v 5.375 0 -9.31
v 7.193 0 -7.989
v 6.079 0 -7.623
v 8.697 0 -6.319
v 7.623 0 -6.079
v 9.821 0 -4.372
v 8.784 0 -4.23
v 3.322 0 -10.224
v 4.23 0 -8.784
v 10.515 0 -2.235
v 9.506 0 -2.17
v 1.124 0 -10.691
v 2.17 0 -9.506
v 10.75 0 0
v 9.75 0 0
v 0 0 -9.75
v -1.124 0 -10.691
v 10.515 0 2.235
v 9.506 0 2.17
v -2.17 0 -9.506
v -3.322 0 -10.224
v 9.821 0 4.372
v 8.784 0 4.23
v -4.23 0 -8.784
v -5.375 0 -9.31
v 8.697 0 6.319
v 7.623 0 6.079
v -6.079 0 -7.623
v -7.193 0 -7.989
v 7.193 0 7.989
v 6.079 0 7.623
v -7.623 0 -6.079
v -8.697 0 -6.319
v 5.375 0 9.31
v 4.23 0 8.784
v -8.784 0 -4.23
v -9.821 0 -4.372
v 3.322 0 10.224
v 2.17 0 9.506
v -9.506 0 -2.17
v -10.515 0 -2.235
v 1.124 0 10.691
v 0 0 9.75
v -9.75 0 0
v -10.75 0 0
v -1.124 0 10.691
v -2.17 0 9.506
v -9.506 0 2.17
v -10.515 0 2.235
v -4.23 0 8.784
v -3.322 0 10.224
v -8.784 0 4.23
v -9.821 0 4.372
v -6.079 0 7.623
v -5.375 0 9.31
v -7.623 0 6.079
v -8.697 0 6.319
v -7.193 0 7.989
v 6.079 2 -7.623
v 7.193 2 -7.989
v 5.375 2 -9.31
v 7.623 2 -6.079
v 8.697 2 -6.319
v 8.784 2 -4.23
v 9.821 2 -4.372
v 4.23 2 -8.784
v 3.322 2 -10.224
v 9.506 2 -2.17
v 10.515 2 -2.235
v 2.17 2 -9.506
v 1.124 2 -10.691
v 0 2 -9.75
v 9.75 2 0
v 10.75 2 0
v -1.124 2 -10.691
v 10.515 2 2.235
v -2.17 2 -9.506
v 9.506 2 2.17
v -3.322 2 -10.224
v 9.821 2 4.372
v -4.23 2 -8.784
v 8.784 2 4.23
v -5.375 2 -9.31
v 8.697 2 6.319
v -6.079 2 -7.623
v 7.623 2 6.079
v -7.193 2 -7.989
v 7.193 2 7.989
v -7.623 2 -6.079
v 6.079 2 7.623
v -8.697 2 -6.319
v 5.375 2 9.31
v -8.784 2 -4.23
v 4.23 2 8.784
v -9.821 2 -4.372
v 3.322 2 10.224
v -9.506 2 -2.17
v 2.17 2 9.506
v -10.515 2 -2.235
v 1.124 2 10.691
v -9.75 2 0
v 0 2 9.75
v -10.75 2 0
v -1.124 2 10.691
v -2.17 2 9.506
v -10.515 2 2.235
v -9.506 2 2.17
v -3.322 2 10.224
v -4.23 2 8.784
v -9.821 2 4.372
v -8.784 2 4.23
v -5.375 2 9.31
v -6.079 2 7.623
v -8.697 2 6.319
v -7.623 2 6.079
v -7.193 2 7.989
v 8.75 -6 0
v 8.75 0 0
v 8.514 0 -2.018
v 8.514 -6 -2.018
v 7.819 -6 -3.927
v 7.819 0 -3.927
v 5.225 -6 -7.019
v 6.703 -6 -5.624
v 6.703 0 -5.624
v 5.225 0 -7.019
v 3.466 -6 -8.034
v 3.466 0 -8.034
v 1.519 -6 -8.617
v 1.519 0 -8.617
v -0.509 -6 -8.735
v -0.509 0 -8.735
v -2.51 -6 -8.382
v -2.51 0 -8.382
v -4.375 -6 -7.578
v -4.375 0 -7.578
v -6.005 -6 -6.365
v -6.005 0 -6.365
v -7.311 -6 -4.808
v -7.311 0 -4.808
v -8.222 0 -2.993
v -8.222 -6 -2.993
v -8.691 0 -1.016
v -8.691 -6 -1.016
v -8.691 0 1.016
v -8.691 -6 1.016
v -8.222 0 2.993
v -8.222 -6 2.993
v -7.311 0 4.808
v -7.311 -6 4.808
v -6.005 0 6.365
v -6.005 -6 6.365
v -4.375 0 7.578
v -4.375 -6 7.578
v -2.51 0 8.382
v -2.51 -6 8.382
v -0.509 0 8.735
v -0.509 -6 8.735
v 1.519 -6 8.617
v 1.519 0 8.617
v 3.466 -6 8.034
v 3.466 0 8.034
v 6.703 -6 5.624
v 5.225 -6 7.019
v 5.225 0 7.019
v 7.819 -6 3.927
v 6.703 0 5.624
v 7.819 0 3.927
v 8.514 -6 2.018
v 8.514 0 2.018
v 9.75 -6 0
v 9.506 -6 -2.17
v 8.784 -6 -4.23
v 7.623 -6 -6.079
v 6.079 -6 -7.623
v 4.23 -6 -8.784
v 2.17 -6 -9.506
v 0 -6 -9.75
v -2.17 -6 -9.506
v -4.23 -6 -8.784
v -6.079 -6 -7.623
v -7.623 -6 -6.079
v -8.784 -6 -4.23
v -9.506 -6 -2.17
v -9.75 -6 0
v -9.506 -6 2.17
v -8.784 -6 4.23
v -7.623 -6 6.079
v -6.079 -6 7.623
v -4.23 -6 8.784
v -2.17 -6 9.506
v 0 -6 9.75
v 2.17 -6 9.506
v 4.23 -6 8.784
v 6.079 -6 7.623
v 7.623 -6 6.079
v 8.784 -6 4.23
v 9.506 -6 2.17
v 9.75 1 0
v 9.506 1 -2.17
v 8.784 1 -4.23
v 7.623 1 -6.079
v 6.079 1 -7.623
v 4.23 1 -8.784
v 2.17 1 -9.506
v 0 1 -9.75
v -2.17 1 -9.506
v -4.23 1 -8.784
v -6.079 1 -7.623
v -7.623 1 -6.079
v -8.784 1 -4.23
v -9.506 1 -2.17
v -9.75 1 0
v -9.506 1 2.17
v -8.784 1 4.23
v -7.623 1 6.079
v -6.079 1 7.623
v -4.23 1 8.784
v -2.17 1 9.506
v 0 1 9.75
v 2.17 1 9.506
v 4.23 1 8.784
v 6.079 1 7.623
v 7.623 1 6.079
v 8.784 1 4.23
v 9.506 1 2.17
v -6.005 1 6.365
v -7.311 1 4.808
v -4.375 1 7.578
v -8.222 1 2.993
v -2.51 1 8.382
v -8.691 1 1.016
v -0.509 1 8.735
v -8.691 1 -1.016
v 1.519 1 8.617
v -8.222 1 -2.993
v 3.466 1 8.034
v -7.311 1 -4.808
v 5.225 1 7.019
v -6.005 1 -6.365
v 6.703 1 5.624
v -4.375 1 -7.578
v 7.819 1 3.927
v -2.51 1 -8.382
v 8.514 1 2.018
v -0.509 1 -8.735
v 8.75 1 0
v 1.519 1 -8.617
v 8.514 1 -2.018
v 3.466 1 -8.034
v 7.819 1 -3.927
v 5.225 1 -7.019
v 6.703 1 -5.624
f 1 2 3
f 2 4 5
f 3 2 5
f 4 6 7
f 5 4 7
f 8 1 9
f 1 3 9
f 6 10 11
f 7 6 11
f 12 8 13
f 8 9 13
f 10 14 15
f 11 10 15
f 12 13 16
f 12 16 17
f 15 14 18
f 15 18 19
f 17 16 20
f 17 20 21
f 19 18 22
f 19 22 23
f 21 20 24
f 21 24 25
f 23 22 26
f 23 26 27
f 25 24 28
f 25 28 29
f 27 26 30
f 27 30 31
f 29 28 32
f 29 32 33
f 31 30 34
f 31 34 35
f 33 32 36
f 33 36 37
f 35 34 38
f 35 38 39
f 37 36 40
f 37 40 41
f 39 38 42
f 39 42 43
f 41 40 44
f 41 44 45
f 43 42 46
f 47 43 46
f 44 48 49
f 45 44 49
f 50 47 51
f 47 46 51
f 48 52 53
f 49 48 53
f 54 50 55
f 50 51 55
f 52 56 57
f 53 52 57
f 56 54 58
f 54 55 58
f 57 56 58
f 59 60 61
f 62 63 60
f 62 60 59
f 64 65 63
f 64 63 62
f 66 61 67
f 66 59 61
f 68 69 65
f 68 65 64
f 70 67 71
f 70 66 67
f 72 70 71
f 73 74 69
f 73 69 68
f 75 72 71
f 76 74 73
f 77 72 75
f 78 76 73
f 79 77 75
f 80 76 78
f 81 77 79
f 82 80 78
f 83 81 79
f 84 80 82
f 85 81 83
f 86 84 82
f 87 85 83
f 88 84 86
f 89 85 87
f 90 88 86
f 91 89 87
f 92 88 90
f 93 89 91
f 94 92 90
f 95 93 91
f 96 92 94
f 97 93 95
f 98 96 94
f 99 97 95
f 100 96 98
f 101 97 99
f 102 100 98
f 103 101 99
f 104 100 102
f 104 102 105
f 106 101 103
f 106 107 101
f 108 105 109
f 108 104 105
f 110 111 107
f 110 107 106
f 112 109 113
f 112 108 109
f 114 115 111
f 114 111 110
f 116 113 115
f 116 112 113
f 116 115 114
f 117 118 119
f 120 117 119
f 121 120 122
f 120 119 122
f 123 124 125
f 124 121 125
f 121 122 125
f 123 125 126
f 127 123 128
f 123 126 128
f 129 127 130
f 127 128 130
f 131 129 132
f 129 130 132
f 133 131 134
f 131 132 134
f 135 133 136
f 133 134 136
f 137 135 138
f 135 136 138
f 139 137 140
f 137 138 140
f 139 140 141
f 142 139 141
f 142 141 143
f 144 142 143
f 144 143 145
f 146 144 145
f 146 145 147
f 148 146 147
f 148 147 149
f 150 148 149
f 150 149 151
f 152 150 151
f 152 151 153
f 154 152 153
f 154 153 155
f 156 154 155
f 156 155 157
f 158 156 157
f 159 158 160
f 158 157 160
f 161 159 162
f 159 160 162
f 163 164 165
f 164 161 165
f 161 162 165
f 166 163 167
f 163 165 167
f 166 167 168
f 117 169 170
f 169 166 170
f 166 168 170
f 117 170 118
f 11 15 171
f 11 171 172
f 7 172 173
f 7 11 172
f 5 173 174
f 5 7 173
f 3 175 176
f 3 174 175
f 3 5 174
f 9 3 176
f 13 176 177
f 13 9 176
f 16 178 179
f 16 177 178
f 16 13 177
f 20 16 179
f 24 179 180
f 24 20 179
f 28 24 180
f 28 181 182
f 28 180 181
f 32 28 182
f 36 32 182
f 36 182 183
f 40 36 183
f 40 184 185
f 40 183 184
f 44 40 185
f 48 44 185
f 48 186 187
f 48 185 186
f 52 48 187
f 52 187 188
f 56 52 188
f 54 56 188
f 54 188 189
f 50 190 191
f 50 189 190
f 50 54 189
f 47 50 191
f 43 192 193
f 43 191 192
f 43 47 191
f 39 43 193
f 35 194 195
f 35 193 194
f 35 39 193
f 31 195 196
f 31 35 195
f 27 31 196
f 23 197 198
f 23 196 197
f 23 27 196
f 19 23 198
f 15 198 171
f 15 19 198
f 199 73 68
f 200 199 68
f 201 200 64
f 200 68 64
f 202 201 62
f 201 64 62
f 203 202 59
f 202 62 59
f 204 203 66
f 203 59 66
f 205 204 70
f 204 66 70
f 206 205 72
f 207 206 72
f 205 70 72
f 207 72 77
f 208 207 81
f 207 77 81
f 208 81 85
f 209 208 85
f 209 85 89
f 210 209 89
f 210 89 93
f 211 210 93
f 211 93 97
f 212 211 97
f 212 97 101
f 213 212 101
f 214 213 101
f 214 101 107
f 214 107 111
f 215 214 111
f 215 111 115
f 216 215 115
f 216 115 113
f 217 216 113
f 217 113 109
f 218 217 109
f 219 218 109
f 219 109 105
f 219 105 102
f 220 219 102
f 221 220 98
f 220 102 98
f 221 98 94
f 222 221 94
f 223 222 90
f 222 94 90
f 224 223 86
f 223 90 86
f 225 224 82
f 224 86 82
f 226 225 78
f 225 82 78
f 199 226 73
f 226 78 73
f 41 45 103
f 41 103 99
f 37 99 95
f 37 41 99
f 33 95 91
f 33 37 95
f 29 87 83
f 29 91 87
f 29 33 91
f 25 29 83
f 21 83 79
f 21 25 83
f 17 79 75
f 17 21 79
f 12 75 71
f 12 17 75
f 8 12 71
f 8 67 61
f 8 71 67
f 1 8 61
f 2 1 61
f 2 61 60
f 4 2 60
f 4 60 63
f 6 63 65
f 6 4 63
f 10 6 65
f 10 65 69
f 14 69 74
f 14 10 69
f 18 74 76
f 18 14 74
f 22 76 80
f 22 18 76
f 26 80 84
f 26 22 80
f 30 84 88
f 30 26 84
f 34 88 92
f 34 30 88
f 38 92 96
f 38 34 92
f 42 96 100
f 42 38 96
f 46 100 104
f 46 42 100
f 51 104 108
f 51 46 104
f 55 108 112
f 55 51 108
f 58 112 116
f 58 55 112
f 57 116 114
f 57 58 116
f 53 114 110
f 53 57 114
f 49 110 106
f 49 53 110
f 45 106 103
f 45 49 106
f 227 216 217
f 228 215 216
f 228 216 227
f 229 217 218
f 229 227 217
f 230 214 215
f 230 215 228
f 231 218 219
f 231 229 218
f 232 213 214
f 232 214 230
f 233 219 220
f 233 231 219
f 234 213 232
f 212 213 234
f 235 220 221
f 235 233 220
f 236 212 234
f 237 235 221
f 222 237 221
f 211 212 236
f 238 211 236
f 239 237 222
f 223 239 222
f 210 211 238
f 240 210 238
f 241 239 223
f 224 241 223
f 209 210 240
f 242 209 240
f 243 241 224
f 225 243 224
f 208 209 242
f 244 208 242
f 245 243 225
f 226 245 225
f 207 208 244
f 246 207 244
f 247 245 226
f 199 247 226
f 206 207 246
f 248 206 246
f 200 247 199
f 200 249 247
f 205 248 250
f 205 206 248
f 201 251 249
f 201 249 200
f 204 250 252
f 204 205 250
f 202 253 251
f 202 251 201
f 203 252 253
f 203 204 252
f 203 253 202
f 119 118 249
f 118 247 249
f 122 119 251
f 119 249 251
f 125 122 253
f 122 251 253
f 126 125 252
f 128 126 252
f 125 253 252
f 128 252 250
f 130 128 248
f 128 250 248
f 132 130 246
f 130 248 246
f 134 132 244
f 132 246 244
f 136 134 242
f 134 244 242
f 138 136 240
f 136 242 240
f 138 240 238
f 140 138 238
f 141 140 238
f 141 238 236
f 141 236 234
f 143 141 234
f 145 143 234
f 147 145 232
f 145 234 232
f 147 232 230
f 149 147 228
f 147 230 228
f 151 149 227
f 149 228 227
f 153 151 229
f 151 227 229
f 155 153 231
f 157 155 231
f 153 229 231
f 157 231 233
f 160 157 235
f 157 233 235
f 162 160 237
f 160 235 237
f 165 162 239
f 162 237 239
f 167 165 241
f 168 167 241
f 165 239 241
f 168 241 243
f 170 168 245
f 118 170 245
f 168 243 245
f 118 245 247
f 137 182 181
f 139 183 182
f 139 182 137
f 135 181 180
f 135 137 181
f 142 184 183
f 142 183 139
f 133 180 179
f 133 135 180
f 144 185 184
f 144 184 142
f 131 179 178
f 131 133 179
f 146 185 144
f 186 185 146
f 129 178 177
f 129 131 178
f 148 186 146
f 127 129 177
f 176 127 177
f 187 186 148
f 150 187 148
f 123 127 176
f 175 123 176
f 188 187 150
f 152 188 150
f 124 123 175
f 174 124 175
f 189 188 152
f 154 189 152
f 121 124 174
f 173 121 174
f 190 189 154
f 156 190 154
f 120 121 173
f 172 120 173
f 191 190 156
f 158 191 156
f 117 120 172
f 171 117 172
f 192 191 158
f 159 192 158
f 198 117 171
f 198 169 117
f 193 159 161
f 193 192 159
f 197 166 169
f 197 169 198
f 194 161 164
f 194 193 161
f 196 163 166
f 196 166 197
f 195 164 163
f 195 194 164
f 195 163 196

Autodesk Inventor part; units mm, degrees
ref_plane "YZ Plane" through (0, 0, 0) normal (1, 0, 0) x (0, 1, 0)
ref_plane "XZ Plane" through (0, 0, 0) normal (0, 1, 0) x (-1, 0, 0)
ref_plane "XY Plane" through (0, 0, 0) normal (0, 0, 1) x (1, 0, 0)
sketch "Sketch1" plane through (0, 0, 0) normal (0, 1, 0) x (-1, 0, 0)
  circle A0 centre (0, 0) radius 9.75
  circle A1 centre (0, 0) radius 10.75
  dimension "d0" = 19.5
  dimension "d1" = 21.5
extrude "Extrusion1" add sketch "Sketch1" along normal blind 2 contours A0 | A1
sketch "Sketch2" plane through (0, 2, 0) normal (0, 1, 0) x (1, 0, 0)
  circle A0 centre (0, 0) radius 9.75
  dimension "d4" = 19.5
extrude "Extrusion2" cut sketch "Sketch2" against normal blind 1
sketch "Sketch3" plane through (0, 1, 0) normal (0, 1, 0) x (1, 0, 0)
  circle A0 centre (0, 0) radius 8.75
  dimension "d7" = 17.5
extrude "Extrusion3" cut sketch "Sketch3" against normal blind 1
sketch "Sketch4" plane through (0, 0, 0) normal (0, -1, 0) x (1, 0, 0)
  circle A0 centre (0, 0) radius 8.75
  circle A1 centre (0, 0) radius 9.75
  dimension "d10" = 19.5
extrude "Extrusion4" add sketch "Sketch4" along normal blind 6
properties part number "685ZZFlanged_Adapter_2mm"
